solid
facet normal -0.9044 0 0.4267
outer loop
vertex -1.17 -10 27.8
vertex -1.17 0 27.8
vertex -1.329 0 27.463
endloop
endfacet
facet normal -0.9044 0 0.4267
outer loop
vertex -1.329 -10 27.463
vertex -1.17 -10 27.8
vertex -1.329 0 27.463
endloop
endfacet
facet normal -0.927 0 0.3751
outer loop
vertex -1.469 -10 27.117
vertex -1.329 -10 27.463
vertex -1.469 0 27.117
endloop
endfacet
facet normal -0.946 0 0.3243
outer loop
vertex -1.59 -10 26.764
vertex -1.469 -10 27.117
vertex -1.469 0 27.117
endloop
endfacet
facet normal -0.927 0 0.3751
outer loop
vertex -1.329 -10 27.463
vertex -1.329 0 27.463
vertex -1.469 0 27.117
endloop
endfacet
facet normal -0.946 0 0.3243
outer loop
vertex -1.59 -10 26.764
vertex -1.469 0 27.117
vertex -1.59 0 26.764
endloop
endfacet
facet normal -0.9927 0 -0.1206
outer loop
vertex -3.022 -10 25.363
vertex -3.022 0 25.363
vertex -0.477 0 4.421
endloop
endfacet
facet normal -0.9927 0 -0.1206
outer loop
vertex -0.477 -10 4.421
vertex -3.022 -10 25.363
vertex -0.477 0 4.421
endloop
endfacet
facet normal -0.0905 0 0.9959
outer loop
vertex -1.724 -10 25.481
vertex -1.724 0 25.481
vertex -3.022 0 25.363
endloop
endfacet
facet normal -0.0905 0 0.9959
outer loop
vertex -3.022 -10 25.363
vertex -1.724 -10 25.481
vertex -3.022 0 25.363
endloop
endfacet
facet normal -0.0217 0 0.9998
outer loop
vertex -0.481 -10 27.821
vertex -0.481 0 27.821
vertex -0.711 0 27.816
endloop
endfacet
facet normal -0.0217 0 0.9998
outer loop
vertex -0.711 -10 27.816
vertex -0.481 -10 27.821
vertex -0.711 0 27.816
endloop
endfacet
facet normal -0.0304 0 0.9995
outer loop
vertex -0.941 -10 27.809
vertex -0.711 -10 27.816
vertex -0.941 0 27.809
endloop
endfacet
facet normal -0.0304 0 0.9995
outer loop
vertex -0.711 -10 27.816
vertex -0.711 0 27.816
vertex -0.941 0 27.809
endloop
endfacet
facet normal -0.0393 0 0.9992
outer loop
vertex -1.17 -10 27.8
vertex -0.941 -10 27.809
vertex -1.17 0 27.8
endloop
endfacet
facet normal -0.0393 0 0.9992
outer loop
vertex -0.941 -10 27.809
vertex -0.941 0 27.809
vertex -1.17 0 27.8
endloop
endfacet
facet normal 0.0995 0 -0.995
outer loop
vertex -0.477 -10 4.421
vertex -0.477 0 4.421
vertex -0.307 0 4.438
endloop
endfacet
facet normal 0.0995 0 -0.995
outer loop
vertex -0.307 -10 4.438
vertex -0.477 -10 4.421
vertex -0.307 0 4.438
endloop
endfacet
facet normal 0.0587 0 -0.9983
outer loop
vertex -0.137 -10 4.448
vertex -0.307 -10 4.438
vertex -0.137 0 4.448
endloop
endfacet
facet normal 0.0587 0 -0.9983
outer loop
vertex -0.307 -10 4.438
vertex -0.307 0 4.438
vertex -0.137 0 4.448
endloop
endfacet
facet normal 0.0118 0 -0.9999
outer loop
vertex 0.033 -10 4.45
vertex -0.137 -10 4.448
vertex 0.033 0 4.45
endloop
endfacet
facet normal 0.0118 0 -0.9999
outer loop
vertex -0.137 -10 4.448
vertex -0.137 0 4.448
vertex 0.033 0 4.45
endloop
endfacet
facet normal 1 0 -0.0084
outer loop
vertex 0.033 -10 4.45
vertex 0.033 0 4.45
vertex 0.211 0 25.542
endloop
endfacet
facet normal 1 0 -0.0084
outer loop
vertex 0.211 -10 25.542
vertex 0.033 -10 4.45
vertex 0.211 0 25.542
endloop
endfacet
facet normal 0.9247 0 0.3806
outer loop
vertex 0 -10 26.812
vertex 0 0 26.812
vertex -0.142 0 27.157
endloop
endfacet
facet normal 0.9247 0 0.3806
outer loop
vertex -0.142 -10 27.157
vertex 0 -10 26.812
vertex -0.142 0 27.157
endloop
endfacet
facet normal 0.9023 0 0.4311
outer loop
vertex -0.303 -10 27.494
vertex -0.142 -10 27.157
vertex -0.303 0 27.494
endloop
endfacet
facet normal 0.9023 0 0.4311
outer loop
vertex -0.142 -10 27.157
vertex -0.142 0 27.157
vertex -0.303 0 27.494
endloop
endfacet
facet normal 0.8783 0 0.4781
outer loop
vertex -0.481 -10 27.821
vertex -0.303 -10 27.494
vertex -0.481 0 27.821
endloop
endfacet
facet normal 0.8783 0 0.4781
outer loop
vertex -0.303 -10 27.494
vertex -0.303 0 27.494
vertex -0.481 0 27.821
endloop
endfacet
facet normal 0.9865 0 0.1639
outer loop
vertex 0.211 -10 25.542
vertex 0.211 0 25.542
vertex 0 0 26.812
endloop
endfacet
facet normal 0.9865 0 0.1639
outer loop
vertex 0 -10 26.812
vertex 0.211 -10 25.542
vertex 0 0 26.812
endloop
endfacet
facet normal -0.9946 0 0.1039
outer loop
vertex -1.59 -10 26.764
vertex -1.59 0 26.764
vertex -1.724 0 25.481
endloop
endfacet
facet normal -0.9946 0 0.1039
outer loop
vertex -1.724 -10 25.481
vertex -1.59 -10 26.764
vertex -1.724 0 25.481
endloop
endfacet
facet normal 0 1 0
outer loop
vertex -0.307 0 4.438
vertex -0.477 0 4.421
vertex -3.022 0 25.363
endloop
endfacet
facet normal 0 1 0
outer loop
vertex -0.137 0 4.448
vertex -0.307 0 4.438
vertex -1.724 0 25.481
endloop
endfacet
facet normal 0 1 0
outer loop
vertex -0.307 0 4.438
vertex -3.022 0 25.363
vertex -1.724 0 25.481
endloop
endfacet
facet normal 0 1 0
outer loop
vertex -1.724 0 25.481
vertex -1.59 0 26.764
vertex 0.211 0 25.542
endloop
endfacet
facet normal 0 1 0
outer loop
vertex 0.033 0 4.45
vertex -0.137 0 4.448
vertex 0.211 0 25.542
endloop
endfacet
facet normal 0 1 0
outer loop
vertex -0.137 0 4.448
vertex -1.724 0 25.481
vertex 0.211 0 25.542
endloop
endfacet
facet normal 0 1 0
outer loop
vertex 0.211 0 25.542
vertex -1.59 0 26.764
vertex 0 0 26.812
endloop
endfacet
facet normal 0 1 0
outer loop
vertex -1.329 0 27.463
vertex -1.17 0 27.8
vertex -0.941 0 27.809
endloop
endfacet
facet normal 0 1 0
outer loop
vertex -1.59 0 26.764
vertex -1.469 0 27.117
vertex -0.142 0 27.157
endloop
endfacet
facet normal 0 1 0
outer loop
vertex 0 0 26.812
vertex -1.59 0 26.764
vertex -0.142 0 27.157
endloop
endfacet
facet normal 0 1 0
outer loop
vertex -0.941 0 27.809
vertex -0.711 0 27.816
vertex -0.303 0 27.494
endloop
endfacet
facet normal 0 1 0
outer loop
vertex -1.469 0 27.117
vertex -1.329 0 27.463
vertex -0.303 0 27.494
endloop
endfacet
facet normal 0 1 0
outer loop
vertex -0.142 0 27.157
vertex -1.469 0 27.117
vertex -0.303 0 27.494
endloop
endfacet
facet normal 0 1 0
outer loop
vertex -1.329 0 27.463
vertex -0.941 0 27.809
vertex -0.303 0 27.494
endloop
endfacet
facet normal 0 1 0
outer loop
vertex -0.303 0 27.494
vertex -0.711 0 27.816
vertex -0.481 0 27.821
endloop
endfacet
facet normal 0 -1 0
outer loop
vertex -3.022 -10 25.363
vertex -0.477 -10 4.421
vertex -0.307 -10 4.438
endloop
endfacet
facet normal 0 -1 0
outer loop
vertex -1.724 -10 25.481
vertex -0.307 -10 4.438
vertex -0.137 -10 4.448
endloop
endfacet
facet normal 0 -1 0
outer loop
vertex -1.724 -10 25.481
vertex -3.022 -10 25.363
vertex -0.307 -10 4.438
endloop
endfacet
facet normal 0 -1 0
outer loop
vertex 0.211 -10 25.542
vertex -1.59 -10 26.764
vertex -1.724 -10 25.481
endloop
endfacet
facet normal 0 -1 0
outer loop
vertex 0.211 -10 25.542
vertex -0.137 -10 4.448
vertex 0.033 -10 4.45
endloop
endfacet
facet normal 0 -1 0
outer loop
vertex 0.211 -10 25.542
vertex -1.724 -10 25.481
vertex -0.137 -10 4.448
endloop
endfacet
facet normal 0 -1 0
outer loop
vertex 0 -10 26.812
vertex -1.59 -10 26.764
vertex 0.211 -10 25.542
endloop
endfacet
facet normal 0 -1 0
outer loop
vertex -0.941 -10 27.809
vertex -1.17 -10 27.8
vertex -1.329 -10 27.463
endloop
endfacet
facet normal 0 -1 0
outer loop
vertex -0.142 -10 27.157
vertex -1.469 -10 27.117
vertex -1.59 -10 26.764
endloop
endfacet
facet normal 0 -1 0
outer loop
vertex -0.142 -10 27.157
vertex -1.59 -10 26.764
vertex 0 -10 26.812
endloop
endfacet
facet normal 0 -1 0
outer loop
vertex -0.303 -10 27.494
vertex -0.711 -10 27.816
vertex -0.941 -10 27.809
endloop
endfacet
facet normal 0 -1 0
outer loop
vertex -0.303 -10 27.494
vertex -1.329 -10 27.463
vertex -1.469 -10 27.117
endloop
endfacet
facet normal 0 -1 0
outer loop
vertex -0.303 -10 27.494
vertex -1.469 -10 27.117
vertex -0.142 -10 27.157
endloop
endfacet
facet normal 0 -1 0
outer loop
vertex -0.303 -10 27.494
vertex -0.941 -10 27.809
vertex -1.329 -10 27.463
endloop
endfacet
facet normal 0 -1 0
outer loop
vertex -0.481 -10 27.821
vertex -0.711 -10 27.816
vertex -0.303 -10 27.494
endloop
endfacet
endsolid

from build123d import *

# Parameters (mm, degrees)
F2_DEPTH = 10


with BuildPart() as f2:
    # F0 (on Front) → F2 (new body)
    with BuildSketch(Plane.XZ):
        with BuildLine():
            Line((0.211261, 25.041597), (0, 26.312215))
            ThreePointArc((0, 26.312215), (-0.220003, 26.826498), (-0.481302, 27.32108))
            ThreePointArc((-0.481302, 27.32108), (-0.825797, 27.312847), (-1.170161, 27.300274))
            ThreePointArc((-1.170161, 27.300274), (-1.401135, 26.790824), (-1.589699, 26.264201))
            Line((-1.589699, 26.264201), (-1.724216, 24.980969))
            Line((-1.724216, 24.980969), (-3.022362, 24.863022))
            Line((-3.022362, 24.863022), (-0.476655, 3.921135))
            ThreePointArc((-0.476655, 3.921135), (-0.222131, 3.943749), (0.033323, 3.949859))
            Line((0.033323, 3.949859), (0.211261, 25.041597))
        make_face()
    extrude(amount=F2_DEPTH)


with BuildPart() as f2_1:
    # F3: moved
    add(f2.part.moved(Location((0, 0, 0.5))))


solid = f2_1.part
